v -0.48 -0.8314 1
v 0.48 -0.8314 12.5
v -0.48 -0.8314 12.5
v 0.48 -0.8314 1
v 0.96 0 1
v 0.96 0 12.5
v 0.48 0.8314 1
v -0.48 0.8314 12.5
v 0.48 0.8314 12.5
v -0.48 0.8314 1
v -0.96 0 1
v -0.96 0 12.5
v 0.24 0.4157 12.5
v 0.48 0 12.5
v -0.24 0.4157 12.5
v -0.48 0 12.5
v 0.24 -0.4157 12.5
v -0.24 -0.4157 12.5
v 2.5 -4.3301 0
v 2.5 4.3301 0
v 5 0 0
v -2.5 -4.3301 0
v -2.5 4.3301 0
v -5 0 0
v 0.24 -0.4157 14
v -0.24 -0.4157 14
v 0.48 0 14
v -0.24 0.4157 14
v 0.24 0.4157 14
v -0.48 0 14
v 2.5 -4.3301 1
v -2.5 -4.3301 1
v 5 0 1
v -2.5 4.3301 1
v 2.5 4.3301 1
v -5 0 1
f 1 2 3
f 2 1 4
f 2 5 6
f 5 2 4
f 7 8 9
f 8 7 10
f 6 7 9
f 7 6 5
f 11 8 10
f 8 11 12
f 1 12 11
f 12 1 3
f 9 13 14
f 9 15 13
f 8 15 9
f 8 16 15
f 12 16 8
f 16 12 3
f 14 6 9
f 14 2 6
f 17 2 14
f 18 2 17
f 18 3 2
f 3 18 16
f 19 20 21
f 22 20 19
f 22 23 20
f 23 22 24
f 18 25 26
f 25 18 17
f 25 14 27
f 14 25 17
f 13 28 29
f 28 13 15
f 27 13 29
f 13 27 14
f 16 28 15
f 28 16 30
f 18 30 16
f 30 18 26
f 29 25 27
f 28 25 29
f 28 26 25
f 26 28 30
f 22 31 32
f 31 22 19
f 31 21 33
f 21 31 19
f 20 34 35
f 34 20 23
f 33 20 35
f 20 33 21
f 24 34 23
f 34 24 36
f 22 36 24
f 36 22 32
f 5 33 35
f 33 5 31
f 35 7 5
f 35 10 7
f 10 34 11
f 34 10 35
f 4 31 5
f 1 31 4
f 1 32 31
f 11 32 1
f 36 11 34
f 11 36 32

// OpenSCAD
// file: cookie_cutter.scad
// Cookie cutter generator
// Pau Fernández <pauek@minidosis.org>
// GNU GPL v2

module dxf(file, layer, height) {
   orig = dxf_cross(file = file, layer = layer);
   echo("origin: ", orig);
   translate([-orig[0], -orig[1], 0])
      linear_extrude(height = height)
         import(file = file, layer = layer);
}

module needle(height, thin1, thin2) {
   union() {
      cylinder(r = thin1, h = height-1.5, $fn = 6);
      cylinder(r = thin2, h = height, $fn = 6);
   }
}

module wall(file, layer, height, thin) {
   difference() {
      minkowski() {
        dxf(file, layer, 0.01);
        cylinder(r = thin, h = height, $fn = 6);
      }
      translate([0, 0, -1]) dxf(file, layer, height + 2);
   }
}

module cutter(file, layer, height, nozzle_diameter) {
   thin1 = nozzle_diameter * 2.4;
   thin2 = nozzle_diameter * 1.2;
   difference() {
      minkowski() {
        dxf(file, layer, 0.01);
        needle(height, thin1, thin2);
      }
      translate([0, 0, -1]) dxf(file, layer, height + 2);
   }
}

module cookie_cutter(file, height, join_height, nozzle_diameter) {
   union () {
      cutter(file, "cutter", height, nozzle_diameter);
      wall(file, "outer", 1, 5);
   }
}

module cookie_cutter_join(file, height, join_height, nozzle_diameter) {
   union () {
      cutter(file, "cutter", height, nozzle_diameter);
      wall(file, "outer", 1, 5);
      dxf(file, "join", join_height);
   }
}
// main file
include <cookie_cutter.scad>;
cookie_cutter_join("campana.dxf", 14, 4, 0.4);
